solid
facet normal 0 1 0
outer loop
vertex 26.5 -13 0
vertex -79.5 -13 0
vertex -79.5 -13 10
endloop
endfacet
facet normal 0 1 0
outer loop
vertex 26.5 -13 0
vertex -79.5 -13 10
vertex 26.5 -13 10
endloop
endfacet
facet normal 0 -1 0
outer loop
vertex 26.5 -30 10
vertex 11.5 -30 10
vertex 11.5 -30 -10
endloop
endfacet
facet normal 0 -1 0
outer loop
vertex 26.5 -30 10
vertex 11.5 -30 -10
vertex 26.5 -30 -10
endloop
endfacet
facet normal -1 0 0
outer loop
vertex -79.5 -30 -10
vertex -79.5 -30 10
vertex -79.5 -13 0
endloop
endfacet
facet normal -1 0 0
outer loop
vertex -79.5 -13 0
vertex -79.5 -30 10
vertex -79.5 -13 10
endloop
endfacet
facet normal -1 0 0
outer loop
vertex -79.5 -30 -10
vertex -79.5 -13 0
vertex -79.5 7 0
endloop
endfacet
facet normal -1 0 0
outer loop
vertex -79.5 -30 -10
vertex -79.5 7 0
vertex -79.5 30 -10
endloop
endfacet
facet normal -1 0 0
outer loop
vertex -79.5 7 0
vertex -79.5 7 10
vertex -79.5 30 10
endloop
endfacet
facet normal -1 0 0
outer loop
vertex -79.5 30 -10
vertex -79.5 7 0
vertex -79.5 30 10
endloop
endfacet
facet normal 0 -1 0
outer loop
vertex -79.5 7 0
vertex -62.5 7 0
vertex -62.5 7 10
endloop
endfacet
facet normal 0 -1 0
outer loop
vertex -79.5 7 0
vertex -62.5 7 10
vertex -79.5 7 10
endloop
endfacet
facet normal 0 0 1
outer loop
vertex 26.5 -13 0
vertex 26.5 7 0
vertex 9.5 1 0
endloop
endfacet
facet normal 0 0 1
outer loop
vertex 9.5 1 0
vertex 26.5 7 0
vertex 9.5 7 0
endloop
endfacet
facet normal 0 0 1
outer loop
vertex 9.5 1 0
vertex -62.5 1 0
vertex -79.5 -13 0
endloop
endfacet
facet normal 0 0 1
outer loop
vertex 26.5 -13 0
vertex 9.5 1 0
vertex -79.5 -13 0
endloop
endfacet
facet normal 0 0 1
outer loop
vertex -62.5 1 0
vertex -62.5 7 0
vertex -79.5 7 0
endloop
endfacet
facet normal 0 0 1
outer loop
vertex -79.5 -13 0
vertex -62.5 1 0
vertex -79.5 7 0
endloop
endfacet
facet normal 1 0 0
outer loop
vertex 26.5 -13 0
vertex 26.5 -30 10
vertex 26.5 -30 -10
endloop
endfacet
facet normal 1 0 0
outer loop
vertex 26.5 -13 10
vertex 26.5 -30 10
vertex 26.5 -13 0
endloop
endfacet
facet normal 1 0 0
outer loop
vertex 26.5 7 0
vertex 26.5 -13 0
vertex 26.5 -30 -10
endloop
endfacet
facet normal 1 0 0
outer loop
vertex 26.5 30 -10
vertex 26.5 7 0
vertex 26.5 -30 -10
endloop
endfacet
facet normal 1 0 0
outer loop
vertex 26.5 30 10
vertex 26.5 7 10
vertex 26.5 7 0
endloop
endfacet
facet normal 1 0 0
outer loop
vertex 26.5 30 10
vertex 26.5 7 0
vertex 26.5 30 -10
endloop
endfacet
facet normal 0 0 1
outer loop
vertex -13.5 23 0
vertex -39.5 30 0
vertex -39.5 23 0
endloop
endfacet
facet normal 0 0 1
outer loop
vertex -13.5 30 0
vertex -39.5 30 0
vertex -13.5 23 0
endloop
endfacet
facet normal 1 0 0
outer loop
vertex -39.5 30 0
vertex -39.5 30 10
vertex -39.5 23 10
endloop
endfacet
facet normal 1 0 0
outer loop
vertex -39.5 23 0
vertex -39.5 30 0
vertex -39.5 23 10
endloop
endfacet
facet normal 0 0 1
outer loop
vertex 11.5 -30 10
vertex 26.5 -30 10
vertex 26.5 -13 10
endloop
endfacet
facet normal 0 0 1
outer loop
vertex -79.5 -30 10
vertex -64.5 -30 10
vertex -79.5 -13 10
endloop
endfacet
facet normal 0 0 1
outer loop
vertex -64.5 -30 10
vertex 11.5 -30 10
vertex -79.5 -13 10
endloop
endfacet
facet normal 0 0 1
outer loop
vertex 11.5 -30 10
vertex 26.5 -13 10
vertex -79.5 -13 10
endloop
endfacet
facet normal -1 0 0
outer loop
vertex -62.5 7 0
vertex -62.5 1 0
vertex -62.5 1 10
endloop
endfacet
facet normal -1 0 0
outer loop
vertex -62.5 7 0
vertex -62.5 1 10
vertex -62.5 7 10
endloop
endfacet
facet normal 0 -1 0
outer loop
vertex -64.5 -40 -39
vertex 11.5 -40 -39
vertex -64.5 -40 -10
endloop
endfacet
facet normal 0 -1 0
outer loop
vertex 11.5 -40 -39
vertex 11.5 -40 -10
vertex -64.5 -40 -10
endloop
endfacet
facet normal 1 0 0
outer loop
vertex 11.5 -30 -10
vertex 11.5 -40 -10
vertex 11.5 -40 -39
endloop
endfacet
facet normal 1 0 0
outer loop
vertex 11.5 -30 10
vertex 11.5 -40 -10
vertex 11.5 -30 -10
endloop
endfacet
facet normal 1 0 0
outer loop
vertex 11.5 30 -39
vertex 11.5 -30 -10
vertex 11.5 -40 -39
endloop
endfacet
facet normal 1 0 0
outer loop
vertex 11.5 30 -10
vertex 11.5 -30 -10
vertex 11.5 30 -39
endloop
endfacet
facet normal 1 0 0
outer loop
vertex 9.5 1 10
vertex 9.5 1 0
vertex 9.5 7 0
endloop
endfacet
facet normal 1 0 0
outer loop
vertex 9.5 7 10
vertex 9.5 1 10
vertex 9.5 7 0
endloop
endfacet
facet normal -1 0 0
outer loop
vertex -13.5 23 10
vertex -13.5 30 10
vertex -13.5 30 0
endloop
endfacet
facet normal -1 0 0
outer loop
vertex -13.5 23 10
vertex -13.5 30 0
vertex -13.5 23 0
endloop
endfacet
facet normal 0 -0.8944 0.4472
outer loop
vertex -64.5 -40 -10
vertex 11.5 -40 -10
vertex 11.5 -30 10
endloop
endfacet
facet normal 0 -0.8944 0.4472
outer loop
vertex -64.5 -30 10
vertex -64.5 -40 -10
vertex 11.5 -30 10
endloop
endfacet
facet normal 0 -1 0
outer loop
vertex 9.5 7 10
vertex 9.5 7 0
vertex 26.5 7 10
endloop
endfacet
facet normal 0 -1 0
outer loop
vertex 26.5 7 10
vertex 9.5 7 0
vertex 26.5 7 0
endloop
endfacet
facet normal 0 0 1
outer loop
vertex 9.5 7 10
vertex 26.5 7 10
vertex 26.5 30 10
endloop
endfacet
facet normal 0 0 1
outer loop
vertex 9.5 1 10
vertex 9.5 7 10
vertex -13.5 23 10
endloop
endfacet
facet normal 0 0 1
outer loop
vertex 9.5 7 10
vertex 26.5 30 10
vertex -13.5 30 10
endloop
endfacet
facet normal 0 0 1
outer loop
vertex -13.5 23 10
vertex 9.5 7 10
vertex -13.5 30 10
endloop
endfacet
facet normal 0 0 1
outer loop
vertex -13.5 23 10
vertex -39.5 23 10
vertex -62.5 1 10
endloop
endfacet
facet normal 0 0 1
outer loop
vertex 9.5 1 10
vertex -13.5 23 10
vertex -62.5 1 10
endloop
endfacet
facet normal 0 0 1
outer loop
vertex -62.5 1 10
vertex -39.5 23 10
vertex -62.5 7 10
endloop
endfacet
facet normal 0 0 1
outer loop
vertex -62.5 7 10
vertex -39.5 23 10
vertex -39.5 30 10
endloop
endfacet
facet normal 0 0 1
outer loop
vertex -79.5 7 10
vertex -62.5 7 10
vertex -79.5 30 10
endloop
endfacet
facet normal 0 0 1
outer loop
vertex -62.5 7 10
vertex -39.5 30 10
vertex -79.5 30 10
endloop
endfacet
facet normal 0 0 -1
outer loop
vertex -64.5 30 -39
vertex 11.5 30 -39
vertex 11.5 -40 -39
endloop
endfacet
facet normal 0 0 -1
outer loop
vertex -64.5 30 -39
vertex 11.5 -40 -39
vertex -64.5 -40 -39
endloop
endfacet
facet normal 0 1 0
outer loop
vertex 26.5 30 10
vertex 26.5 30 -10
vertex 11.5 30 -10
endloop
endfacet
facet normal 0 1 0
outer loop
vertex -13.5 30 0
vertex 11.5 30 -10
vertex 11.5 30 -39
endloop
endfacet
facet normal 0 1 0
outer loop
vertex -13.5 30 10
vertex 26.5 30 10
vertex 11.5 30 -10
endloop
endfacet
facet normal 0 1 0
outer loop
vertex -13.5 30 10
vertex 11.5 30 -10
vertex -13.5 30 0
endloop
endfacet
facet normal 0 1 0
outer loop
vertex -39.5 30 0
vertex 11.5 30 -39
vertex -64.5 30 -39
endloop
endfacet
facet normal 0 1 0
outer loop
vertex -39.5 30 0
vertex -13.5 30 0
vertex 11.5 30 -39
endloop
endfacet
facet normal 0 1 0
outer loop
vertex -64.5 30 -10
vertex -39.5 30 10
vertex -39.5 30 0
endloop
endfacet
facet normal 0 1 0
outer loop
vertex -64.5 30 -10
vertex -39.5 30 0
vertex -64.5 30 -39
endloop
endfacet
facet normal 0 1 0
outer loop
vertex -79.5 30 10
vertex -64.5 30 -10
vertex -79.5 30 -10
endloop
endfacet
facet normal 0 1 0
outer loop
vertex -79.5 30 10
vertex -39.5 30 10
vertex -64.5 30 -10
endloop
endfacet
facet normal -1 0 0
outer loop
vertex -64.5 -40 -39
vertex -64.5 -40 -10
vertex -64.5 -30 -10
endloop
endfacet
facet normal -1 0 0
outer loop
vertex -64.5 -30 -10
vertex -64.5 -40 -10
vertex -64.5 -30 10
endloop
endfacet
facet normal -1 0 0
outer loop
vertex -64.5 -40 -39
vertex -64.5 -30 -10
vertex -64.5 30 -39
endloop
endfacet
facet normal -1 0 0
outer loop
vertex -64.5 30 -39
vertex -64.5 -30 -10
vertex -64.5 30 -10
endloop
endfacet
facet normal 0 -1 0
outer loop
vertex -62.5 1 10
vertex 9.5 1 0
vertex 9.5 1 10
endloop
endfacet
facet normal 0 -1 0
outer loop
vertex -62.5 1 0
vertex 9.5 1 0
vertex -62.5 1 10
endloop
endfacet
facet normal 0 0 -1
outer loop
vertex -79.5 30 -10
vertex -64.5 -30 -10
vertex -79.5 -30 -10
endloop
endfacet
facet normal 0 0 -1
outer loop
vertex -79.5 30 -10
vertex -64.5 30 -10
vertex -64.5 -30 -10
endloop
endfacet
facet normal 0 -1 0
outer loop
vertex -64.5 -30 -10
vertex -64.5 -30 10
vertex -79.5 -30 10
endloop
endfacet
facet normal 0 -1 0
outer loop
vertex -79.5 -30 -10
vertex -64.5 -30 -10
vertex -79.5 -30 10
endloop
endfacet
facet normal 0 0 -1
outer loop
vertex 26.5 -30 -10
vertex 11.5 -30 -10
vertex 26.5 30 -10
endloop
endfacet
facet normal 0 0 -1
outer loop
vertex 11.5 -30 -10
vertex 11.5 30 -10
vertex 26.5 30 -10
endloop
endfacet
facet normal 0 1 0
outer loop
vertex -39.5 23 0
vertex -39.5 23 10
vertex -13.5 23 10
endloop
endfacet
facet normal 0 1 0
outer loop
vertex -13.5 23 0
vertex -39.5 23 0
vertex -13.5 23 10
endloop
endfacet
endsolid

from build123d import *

# Parameters (mm, degrees)
EXTRUDE_1_DEPTH   = 10
EXTRUDE_1_2_DEPTH = 10
EXTRUDE_2_DEPTH   = 10
SKETCH_3_W        = 38
SKETCH_3_H        = 70
EXTRUDE_3_DEPTH   = 9
EXTRUDE_4_DEPTH   = 38
SKETCH_5_W        = 26
SKETCH_5_H        = 7
EXTRUDE_5_DEPTH   = 10
SKETCH_6_W        = 76
SKETCH_6_H        = 70
EXTRUDE_6_DEPTH   = 20


with BuildPart() as part:
    # Эскиз1 → Бобышка-Вытянуть1 (new body)
    with BuildSketch(Plane.XY):
        Polygon((-26.5, 23), (-26.5, 1), (9.5, 1), (9.5, 7), (26.5, 7), (26.5, 30), (-13.5, 30), (-13.5, 23), align=None)
    extrude(amount=EXTRUDE_1_DEPTH)



with BuildPart() as body_2:
    # Эскиз1 → Extrude 1 2 (new body)
    with BuildSketch(Plane.XY):
        Polygon((-26.5, -13), (-26.5, -30), (26.5, -30), (26.5, -13), (9.5, -13), align=None)
    extrude(amount=EXTRUDE_1_2_DEPTH)


with BuildPart() as part_1:
    add(part.part)

    add(body_2.part)  # Бобышка-Вытянуть2 merges body 2
    # Эскиз2 → Бобышка-Вытянуть2 (add)
    with BuildSketch(Plane(origin=(0, 0, 0), x_dir=(-1, 0, 0), z_dir=(0, 0, -1))):
        Polygon((-26.5, -30), (-26.5, 30), (13.5, 30), (13.5, 23), (26.5, 23), (26.5, -30), align=None)
    extrude(amount=EXTRUDE_2_DEPTH)

    # Эскиз3 → Бобышка-Вытянуть3 (add)
    with BuildSketch(Plane(origin=(0, 0, -10), x_dir=(-1, 0, 0), z_dir=(0, 0, -1))):
        with Locations((7.5, -5)):
            Rectangle(SKETCH_3_W, SKETCH_3_H)
    extrude(amount=EXTRUDE_3_DEPTH)

    # Эскиз4 → Бобышка-Вытянуть4 (add)
    with BuildSketch(Plane(origin=(11.5, 0, 0), x_dir=(0, 0, -1), z_dir=(1, 0, 0))):
        Polygon((10, -40), (-10, -30), (10, -30), align=None)
    extrude(amount=-EXTRUDE_4_DEPTH)

    # Зеркальное отражение1: part across plane


with BuildPart() as part_2:
    add(part_1.part)
    add(part_1.part.mirror(Plane(origin=(-26.5, 0, 10), x_dir=(0, 0, 1), z_dir=(-1, 0, 0))))

    # Эскиз5 → Бобышка-Вытянуть5 (add)
    with BuildSketch(Plane.XY.offset(-10)):
        with Locations((-26.5, 26.5)):
            Rectangle(SKETCH_5_W, SKETCH_5_H)
    extrude(amount=EXTRUDE_5_DEPTH)

    # Эскиз6 → Бобышка-Вытянуть6 (add)
    with BuildSketch(Plane(origin=(0, 0, -19), x_dir=(-1, 0, 0), z_dir=(0, 0, -1))):
        with Locations((26.5, -5)):
            Rectangle(SKETCH_6_W, SKETCH_6_H)
    extrude(amount=EXTRUDE_6_DEPTH)


solid = part_2.part
